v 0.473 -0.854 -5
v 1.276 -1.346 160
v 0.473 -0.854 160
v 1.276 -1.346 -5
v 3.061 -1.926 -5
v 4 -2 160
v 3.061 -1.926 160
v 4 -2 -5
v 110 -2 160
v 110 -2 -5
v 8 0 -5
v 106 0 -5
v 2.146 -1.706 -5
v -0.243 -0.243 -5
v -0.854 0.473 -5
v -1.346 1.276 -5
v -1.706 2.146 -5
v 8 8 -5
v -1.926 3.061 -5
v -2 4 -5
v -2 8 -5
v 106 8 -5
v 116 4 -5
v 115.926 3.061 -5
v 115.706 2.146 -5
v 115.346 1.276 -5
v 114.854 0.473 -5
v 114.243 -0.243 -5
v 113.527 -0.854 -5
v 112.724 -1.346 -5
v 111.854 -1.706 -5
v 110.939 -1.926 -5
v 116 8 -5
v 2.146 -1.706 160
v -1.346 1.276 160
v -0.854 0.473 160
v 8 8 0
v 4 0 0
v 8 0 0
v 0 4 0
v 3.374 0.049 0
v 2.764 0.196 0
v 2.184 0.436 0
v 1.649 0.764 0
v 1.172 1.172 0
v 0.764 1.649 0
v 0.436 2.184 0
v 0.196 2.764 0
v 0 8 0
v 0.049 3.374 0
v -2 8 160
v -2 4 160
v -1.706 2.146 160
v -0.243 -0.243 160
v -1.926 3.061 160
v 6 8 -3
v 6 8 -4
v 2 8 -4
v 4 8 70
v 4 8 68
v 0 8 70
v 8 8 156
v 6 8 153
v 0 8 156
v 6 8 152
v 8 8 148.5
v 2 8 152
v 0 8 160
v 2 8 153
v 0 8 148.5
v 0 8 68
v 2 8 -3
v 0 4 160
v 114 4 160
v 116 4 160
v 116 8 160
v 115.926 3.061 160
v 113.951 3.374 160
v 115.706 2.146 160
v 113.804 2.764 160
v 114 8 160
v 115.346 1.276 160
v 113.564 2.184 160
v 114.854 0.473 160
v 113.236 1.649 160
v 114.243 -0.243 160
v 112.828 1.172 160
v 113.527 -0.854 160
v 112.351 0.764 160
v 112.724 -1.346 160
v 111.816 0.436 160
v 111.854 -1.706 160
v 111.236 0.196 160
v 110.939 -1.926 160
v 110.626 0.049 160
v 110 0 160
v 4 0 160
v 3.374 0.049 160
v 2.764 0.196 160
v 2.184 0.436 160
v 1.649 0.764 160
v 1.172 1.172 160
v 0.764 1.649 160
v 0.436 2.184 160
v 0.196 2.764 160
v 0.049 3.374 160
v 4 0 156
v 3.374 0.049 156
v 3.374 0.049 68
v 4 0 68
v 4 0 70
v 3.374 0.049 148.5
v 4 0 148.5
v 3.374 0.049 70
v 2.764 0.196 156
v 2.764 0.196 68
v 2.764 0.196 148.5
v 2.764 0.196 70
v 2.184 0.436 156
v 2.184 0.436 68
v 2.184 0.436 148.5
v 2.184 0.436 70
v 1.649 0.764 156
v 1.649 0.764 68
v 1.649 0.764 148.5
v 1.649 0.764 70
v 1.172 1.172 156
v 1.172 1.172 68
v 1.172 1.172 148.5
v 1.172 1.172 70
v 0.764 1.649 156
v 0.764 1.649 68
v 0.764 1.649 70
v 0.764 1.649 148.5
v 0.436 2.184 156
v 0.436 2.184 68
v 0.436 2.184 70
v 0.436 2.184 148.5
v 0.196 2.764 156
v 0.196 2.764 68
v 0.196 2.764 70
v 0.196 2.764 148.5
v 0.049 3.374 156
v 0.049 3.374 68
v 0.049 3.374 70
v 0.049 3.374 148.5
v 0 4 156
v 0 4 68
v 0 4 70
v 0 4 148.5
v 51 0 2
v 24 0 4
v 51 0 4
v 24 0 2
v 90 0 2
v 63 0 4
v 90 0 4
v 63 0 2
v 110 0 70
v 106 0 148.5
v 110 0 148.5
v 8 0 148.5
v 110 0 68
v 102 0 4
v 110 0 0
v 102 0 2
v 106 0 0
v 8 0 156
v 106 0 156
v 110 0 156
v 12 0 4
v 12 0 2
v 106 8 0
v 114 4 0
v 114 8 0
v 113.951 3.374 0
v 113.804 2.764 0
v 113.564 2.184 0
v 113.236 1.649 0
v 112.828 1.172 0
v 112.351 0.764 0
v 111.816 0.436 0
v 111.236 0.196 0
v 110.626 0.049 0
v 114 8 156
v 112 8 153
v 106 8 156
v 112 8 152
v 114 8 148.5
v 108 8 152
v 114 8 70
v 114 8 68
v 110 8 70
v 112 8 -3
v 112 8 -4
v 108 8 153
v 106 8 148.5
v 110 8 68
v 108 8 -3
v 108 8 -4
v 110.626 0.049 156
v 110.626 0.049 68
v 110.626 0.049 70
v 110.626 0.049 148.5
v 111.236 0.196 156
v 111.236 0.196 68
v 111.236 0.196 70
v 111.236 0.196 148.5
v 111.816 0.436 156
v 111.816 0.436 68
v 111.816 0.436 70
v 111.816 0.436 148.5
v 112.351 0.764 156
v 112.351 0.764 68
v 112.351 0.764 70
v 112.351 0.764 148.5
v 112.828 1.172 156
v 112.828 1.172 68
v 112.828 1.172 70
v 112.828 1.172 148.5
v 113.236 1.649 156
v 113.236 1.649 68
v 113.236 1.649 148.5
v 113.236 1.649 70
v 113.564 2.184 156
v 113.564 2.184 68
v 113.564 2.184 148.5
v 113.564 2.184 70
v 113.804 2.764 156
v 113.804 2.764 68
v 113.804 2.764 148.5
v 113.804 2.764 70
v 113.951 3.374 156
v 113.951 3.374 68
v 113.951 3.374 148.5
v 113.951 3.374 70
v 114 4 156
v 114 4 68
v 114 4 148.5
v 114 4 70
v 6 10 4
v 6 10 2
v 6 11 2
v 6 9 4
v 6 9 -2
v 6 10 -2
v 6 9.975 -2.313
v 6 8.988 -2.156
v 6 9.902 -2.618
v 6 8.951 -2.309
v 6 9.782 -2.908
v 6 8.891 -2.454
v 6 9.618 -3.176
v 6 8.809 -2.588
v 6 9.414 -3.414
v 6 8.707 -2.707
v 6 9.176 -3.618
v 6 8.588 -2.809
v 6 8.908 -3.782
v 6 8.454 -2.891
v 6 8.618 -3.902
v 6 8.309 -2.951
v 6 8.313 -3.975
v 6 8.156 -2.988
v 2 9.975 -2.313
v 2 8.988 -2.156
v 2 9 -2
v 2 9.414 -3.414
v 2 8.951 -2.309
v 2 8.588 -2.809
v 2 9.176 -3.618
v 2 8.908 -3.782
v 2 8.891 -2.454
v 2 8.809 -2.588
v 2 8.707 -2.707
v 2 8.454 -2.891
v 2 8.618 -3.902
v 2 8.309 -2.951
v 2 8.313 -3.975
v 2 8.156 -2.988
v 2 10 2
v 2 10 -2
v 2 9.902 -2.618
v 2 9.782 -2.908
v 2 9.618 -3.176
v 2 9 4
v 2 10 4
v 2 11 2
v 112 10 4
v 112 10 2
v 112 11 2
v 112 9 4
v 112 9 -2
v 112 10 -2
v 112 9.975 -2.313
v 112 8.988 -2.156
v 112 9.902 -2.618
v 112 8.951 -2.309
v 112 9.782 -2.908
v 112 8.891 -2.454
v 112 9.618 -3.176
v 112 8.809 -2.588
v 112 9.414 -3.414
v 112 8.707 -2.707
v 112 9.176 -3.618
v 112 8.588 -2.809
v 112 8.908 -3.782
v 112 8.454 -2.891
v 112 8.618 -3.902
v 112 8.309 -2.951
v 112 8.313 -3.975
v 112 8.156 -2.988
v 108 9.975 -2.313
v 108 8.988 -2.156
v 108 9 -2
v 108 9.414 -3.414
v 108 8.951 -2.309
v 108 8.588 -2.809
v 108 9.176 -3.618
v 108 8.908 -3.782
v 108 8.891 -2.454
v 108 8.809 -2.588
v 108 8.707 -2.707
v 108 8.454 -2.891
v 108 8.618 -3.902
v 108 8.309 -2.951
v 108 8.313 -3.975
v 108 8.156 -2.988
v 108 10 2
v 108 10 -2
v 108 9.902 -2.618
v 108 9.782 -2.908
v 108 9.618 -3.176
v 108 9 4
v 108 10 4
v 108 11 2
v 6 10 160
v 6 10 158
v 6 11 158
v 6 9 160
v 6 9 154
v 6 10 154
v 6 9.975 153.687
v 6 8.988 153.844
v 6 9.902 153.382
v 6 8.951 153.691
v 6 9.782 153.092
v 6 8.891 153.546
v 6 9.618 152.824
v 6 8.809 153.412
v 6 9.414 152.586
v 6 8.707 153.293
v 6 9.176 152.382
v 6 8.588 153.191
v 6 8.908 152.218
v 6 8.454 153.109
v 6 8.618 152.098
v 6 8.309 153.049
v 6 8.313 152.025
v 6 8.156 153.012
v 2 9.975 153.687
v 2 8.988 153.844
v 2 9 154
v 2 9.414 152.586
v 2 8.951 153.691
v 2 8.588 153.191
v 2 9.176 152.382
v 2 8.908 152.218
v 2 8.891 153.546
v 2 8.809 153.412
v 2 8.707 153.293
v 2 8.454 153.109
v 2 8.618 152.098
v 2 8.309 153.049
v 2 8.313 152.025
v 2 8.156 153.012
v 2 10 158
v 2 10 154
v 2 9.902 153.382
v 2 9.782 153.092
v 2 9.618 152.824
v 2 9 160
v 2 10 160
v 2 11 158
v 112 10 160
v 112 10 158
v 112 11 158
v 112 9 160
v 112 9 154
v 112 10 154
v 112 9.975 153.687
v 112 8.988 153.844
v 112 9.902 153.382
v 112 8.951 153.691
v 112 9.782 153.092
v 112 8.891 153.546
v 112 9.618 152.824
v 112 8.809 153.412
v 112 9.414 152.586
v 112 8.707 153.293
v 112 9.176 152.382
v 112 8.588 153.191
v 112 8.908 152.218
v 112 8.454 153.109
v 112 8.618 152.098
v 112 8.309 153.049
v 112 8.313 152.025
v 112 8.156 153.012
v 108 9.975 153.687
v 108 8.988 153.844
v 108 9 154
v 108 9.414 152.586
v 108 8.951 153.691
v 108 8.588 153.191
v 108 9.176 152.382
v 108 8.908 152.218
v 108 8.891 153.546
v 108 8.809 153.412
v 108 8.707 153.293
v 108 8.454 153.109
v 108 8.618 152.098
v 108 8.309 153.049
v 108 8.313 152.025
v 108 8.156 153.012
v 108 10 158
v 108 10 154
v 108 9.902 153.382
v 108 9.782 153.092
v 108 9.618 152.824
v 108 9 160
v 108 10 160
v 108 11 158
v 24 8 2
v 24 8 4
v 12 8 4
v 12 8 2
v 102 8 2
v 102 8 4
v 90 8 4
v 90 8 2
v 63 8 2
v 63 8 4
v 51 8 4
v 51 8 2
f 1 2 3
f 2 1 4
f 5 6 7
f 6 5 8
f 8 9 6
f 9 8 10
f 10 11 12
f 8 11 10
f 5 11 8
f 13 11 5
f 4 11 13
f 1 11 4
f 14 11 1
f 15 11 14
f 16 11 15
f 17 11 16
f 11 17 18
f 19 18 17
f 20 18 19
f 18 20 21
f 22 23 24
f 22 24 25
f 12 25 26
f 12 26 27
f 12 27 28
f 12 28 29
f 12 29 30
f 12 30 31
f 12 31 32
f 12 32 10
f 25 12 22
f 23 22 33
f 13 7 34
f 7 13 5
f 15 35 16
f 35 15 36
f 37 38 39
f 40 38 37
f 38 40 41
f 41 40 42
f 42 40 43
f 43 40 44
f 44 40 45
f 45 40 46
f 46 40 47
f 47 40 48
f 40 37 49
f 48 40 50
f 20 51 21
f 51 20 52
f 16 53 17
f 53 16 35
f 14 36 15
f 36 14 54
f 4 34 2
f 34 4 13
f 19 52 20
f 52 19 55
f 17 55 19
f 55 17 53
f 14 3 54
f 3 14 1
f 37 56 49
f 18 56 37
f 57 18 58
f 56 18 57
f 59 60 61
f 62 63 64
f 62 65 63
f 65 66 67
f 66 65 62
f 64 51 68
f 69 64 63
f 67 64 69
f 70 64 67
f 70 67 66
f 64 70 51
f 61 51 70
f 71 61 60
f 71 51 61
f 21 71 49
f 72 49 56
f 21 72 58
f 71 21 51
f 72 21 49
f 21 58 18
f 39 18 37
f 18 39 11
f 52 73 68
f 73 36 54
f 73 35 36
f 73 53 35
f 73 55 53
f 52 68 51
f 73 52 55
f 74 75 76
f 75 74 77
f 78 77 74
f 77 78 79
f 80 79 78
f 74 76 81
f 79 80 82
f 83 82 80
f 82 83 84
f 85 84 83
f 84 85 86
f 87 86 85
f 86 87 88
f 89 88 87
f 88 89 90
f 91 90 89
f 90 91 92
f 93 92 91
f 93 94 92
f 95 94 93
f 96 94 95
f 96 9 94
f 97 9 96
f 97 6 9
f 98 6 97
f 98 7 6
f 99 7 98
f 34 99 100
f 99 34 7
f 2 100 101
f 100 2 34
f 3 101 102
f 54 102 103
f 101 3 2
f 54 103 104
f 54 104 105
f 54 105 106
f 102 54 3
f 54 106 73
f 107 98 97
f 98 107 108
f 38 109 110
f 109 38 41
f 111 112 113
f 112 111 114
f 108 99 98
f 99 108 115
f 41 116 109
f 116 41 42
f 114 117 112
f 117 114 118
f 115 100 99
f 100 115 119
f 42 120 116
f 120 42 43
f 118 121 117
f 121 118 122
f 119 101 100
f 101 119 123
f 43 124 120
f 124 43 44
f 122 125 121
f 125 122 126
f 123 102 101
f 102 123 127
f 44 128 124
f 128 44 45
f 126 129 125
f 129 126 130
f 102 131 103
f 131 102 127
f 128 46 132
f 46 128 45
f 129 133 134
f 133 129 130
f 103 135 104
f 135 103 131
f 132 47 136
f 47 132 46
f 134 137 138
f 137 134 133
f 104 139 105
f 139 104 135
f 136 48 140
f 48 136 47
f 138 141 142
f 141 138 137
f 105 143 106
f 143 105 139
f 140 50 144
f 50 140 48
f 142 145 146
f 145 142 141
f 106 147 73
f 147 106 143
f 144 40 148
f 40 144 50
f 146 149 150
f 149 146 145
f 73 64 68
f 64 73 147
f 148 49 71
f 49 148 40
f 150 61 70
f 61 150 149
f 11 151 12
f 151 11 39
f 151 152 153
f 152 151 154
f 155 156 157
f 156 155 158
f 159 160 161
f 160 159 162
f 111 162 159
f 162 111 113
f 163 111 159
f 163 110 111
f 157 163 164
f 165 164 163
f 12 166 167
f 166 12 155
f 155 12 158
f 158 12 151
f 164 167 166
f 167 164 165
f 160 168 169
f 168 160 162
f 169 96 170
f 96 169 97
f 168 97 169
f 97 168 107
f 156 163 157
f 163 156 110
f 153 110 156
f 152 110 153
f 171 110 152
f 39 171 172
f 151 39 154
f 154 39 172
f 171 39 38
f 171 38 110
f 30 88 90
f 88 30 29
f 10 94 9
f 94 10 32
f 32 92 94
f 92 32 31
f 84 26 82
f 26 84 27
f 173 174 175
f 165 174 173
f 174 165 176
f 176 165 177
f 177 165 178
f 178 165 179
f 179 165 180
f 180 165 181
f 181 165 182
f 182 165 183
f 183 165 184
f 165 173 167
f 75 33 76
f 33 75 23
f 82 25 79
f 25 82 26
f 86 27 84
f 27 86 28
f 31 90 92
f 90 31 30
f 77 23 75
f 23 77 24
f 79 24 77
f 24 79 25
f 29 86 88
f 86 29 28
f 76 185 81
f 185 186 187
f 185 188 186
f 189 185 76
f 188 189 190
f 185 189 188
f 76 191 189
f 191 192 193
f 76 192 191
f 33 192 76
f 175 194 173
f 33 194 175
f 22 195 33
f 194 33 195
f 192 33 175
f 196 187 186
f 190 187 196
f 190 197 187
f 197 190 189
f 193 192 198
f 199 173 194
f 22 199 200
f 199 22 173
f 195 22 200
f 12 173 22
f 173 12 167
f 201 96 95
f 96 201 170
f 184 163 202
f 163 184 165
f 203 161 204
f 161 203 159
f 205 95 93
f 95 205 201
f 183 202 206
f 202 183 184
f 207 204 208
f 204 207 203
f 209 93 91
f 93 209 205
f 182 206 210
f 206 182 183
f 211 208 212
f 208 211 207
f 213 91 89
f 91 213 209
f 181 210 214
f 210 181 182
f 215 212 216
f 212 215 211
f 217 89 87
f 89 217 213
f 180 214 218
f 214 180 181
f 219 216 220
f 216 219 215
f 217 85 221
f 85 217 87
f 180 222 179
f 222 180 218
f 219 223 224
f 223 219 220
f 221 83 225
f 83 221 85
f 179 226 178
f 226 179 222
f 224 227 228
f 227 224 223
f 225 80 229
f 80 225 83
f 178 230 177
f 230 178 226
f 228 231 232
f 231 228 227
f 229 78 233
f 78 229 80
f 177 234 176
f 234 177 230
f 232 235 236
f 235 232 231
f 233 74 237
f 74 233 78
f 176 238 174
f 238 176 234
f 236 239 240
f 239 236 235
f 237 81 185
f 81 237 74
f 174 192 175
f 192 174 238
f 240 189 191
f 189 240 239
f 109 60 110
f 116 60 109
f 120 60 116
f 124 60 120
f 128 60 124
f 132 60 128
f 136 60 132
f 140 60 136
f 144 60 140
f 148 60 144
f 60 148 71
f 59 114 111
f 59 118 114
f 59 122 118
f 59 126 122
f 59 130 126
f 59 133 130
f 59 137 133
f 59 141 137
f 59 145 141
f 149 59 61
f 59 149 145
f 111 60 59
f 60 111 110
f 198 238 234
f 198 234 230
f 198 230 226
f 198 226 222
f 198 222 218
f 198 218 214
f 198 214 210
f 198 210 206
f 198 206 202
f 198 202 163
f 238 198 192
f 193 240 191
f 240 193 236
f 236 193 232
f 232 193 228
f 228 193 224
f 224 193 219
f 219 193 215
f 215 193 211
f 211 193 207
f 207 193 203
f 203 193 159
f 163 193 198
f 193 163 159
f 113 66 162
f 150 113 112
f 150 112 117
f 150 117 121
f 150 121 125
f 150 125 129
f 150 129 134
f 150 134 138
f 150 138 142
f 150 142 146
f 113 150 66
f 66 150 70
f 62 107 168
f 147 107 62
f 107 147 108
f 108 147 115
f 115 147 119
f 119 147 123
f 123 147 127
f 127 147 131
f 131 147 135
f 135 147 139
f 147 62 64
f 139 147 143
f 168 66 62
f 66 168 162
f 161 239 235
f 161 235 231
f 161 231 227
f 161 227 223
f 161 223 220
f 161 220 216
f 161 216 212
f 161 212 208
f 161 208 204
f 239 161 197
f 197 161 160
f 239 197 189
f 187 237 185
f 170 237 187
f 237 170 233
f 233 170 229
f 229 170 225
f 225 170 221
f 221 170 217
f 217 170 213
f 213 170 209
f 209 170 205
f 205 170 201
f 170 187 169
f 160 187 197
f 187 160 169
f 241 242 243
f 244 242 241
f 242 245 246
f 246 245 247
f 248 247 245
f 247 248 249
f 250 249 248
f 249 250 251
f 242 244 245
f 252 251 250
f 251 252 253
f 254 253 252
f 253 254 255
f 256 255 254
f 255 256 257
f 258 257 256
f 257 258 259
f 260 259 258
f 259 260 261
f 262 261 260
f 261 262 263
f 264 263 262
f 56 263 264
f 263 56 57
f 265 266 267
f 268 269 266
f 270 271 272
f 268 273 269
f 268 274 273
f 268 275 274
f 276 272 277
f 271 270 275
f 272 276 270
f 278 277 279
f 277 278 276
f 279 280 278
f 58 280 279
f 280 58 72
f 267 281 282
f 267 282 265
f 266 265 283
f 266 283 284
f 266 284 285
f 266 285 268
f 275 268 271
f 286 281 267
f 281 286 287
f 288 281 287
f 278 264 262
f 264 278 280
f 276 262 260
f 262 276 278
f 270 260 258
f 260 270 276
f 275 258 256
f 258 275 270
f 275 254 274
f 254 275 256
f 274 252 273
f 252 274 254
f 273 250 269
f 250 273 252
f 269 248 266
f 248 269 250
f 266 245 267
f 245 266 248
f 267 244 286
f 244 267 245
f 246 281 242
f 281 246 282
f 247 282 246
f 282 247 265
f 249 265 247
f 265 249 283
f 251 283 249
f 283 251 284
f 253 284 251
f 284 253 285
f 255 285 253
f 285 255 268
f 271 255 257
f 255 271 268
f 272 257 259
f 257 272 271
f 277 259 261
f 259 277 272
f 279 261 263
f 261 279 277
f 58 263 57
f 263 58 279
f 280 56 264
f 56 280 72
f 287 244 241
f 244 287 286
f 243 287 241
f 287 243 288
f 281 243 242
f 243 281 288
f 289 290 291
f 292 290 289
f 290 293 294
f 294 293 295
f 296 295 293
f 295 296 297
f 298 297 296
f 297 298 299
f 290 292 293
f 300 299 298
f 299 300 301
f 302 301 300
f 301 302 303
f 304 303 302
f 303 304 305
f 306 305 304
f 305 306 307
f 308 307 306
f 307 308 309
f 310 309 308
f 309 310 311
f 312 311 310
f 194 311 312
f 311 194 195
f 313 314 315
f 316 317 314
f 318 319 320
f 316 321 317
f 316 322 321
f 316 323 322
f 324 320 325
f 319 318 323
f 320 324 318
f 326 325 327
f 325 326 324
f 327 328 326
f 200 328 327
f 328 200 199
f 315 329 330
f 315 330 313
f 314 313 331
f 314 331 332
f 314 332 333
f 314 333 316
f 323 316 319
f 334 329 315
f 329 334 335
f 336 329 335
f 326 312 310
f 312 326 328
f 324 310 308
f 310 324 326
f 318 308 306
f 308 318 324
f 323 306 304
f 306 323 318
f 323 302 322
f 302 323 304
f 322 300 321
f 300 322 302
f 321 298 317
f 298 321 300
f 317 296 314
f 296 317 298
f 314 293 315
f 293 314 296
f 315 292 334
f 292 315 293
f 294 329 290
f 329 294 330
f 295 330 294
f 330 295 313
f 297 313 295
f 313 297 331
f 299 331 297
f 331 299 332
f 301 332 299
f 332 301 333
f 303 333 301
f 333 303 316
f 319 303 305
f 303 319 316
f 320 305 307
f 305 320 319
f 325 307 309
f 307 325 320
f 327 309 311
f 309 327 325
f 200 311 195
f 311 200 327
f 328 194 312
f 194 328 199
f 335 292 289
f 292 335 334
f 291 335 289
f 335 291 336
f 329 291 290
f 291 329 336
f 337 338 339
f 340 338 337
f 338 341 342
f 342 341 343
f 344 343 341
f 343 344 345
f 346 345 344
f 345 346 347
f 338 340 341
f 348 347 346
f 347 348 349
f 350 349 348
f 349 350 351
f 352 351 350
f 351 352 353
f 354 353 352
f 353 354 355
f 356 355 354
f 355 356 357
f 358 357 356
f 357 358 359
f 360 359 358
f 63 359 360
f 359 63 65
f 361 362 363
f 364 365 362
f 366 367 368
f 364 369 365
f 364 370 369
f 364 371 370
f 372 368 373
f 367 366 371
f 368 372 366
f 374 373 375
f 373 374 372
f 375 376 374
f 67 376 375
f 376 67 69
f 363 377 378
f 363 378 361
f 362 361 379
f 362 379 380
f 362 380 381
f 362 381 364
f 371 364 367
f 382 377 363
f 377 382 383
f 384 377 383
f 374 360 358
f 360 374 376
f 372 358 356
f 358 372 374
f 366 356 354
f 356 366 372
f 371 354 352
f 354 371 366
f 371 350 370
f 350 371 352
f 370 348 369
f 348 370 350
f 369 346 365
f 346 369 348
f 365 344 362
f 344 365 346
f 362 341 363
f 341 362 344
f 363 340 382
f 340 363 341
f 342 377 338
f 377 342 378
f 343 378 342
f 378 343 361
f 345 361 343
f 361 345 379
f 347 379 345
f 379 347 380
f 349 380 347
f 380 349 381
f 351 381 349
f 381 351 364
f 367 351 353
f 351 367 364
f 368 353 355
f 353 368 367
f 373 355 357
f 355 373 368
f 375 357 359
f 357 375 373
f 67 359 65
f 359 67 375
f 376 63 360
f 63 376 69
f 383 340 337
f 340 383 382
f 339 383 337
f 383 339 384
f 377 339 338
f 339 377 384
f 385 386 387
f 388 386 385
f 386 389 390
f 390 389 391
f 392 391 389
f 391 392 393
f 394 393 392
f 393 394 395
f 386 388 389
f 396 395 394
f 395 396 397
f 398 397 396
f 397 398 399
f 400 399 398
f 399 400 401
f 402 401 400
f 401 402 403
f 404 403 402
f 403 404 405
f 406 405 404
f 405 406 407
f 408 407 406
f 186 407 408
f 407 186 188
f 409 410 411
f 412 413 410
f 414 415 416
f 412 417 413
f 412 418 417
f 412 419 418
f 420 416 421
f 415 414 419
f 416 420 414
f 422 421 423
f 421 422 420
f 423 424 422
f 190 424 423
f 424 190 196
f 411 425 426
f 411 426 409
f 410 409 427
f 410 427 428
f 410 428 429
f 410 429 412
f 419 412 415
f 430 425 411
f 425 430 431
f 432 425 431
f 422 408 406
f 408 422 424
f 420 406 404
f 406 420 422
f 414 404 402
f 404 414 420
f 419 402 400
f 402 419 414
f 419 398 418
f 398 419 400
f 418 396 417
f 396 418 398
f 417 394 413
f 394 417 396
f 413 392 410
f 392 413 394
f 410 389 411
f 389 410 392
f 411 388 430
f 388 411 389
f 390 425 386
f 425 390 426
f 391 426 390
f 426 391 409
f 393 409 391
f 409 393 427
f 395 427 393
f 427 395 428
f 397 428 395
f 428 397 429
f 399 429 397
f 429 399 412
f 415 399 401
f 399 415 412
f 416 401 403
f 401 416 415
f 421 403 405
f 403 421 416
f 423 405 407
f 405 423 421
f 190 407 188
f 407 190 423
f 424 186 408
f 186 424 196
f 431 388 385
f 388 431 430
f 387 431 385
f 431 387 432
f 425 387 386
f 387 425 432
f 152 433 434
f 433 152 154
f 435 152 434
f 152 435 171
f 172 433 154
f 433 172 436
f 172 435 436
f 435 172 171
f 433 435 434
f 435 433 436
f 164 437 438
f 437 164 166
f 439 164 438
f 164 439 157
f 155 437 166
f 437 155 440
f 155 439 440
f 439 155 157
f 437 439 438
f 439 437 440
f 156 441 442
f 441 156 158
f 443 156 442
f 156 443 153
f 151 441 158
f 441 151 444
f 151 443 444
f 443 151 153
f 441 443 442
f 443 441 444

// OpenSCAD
$fn=40;
front_panel();
//corner(solid=false);
stand_h = 5;
bottom_lock_w = 12;
side_lock_h = 70;
vent_edge = 20;

module front_panel(box_width=114, box_depth=220, box_height=160, t=2, r=4)
{
    // Bottom stands
    translate([r,r,-stand_h]) {
        corner(h=stand_h);
        corner(h=stand_h+box_height,solid=false);
    }
    translate([box_width-r,r,-stand_h]) mirror([1,0,0]) {
        corner(h=stand_h);
        corner(h=stand_h+box_height,solid=false);
    }

    // Bottom locks
    translate([3*r,0,t]) cube([bottom_lock_w, 2*r, t]);
    translate([box_width-bottom_lock_w-3*r,0,t]) cube([bottom_lock_w, 2*r, t]);
    translate([(box_width-bottom_lock_w)/2,0,t]) cube([bottom_lock_w, 2*r, t]);

	// Side locks
	translate([r,r,side_lock_h-t]) difference() {
		corner(h=t);
		translate([0,-r-t,-t])cube([r+t,2*(r+t),3*t]);
	}
	translate([box_width-r,r,side_lock_h-t])mirror([1,0,0]) difference() {
		corner(h=t);
		translate([0,-r-t,-t])cube([r+t,2*(r+t),3*t]);
	}
	
    // Top blocks
    translate([r,r,box_height-2*t-1.5*stand_h]) corner(h=1.5*stand_h);
    translate([box_width-r,r,box_height-2*t-1.5*stand_h])mirror([1,0,0]) corner(h=1.5*stand_h);
    translate([r,-t,-stand_h])cube([box_width-2*r,t,box_height+stand_h]);
    
    // Snap-in
    snap_h = 8;
    translate([r,2*r,-snap_h+2*t]) snap_in(h=snap_h);
    translate([box_width-r,2*r,-snap_h+2*t]) snap_in(h=snap_h);
    translate([r,2*r,box_height-snap_h]) snap_in(h=snap_h);
    translate([box_width-r,2*r,box_height-snap_h]) snap_in(h=snap_h);
}

module left_panel(box_width=114, box_depth=220, box_height=160, t=2, r=4)
{
	difference() {
		union() {
			translate([-t,0,t]) cube([t, box_depth-4*r, box_height-t]);
			translate([0,-r,side_lock_h]) cube([t,2*r,box_height-2*t-1.5*stand_h-side_lock_h]);
			translate([-t,0,side_lock_h]) cube([2*t,r,box_height-2*t-1.5*stand_h-side_lock_h]);
			translate([0,box_depth-5*r,side_lock_h]) cube([t,2*r,box_height-2*t-1.5*stand_h-side_lock_h]);
			translate([-t,box_depth-5*r,side_lock_h]) cube([2*t,r,box_height-2*t-1.5*stand_h-side_lock_h]);
		}
		translate([-2*t,vent_edge,(box_height-vent_edge)/2]) cube([3*t,box_depth-4*r-4*vent_edge,(box_height-vent_edge)/2]);
	}
	translate([-t,vent_edge,(box_height-vent_edge)/2])rotate([90,0,90]) grid(box_depth-4*r-4*vent_edge,(box_height-vent_edge)/2);
}

module cut_left_panel(box_width=114, box_depth=220, box_height=160, t=2, r=4)
{
	io_size = [3*t, 55, 16];
	io_p = [-2*t, box_depth-2-io_size[1], 20+r];

	difference() {
		translate([0,2*r,0]) left_panel(box_width=box_width, box_depth=box_depth, box_height=box_height);
		translate(io_p) cube(io_size);
	}
}

module cut_back_panel(box_width=114, box_depth=220, box_height=160, t=2, r=4)
{
	io_size = [3*t, 55, 16];
	io_p = [-2*t, box_depth-2-io_size[1], 20+r];
	pwr_size = [10, 3*t, 10];
	pwr_p = [32, box_depth-t, 39+r];
	rst_r = 2;
	rst_p = [74, box_depth+2*t, 43+r];
	hdmi_size = [16, 3*t, 7];
	hdmi_p = [47, box_depth-t, 20+r];

	wifi_p = [[box_width/2-2*r, box_depth+2*t, 65], [box_width/2+2*r, box_depth+2*t, 65]];
	wifi_r = 3;

	difference() {
		translate([0,box_depth,0]) mirror([0,1,0])
			front_panel(box_width=box_width, box_depth=box_depth, box_height=box_height);
		translate(io_p) cube(io_size);
		translate(pwr_p) cube(pwr_size);
		translate(rst_p) rotate([90,0,0]) cylinder(h=3*t, r=rst_r);
		translate(hdmi_p) cube(hdmi_size);

		for(p=wifi_p) {
			translate(p) rotate([90,0,0]) cylinder(h=3*t, r=wifi_r);
			translate(p+[0,-1.5*t,0]) rotate([90,0,0]) cylinder(h=2*t, r=wifi_r+2.5);
		}
	}
}

module cut_right_panel(box_width=114, box_depth=220, box_height=160, t=2, r=4)
{
	fan_r = 50.2/2;
	fan_hr = 4/2;
	fan_size = [10, 2*fan_r, 2*fan_r];
	fan_p = [box_width-fan_size[0]+t/2, box_depth-fan_size[1]-3*r, t];
	fan_cp = fan_p + [fan_size[0]-t/2, fan_r, fan_r];
	fan_hp = [fan_cp + [0,20,20], fan_cp + [0,-20,20], fan_cp + [0,20,-20], fan_cp + [0,-20,-20]];

	difference() {
		translate([box_width,2*r,0]) mirror([1,0,0])
			left_panel(box_width=box_width, box_depth=box_depth, box_height=box_height);
		translate(fan_p) cube(fan_size);
		translate(fan_cp) rotate([0,90,0]) cylinder(r=fan_r-1.5, h=3*t);

		for(c=fan_hp) {
			translate(c) rotate([0,90,0]) cylinder(r=fan_hr, h=3*t);
		}
	}
	translate(fan_cp+[t/2,0,0]) rotate([0,90,0]) intersection() {
		translate([-fan_r,-fan_r,0]) grid(2*fan_r, 2*fan_r);
		cylinder(r=fan_r-1.2, h=t/2);
	}
}

module corner(r=4, h=8, t=2, solid=true)
{
    r = r+t;
    difference() {
        if(solid) {
            linear_extrude(height=h){
                union() {
                    circle(r=r);
                    translate([-r,0,0])square([2*r,r]);
                    translate([0,-r,0])square([r,2*r]);
                }
            }
        }
        else {
            linear_extrude(height=h) difference(){
                union() {
                    circle(r=r);
                    translate([-r,0,0])square([2*r,r]);
                    translate([0,-r,0])square([r,2*r]);
                }
                circle(r=r-t);
                translate([-r+t,0,0])square([2*r,r]);
                translate([0,-r+t,0])square([r,2*r]);
            }
        }
        
        translate([-2*r,r-t,-t])cube([4*r,2*t,h+2*t]);
        translate([r-t,-2*r,-t])cube([2*t,4*r,h+2*t]);
    }
}

module snap_in(h=8, w=4, t=2)
{
    translate([-w/2,0,0]) union() {
        translate([w,0,t])rotate([0,-90,0]) linear_extrude(height=w) difference(){
            union() {
                circle(r=t);
                square([t,t]);
            }
            translate([-t,-t]) square([2*t,t]);
            circle(r=t/2);
            square([t/2,t/2]);
            translate([0,-t/2]) square([2*t,t]);
        }
        translate([0,t/2,t]) cube([w,t/2,h-t]); 
        translate([0,t/2,h-t]) linear_extrude(scale=[1,0.5],height=t) #square([w,t]);
    }
}

module grid(w,h,eye=2,wall=1,thickness=2,ext=0)
{
    x = floor((w-eye)/(eye+wall));
    y = floor((h-eye)/(eye+wall));
    
    mesh_w = eye*(x-1) + wall*(x);
    mesh_h = eye*(y-1) + wall*(y);
    
    offset = [(w-mesh_w)/4, (h-mesh_h)/4,0];
 
    union() {
        for(i=[0:x]){
            translate([offset[0]+i*(eye+wall),-ext,0]) cube([wall,h+2*ext,thickness]);
        }
        for(j=[0:y]){
            translate([-ext,offset[1]+j*(eye+wall),0]) cube([w+2*ext,wall,thickness]);
        }
    }
}
